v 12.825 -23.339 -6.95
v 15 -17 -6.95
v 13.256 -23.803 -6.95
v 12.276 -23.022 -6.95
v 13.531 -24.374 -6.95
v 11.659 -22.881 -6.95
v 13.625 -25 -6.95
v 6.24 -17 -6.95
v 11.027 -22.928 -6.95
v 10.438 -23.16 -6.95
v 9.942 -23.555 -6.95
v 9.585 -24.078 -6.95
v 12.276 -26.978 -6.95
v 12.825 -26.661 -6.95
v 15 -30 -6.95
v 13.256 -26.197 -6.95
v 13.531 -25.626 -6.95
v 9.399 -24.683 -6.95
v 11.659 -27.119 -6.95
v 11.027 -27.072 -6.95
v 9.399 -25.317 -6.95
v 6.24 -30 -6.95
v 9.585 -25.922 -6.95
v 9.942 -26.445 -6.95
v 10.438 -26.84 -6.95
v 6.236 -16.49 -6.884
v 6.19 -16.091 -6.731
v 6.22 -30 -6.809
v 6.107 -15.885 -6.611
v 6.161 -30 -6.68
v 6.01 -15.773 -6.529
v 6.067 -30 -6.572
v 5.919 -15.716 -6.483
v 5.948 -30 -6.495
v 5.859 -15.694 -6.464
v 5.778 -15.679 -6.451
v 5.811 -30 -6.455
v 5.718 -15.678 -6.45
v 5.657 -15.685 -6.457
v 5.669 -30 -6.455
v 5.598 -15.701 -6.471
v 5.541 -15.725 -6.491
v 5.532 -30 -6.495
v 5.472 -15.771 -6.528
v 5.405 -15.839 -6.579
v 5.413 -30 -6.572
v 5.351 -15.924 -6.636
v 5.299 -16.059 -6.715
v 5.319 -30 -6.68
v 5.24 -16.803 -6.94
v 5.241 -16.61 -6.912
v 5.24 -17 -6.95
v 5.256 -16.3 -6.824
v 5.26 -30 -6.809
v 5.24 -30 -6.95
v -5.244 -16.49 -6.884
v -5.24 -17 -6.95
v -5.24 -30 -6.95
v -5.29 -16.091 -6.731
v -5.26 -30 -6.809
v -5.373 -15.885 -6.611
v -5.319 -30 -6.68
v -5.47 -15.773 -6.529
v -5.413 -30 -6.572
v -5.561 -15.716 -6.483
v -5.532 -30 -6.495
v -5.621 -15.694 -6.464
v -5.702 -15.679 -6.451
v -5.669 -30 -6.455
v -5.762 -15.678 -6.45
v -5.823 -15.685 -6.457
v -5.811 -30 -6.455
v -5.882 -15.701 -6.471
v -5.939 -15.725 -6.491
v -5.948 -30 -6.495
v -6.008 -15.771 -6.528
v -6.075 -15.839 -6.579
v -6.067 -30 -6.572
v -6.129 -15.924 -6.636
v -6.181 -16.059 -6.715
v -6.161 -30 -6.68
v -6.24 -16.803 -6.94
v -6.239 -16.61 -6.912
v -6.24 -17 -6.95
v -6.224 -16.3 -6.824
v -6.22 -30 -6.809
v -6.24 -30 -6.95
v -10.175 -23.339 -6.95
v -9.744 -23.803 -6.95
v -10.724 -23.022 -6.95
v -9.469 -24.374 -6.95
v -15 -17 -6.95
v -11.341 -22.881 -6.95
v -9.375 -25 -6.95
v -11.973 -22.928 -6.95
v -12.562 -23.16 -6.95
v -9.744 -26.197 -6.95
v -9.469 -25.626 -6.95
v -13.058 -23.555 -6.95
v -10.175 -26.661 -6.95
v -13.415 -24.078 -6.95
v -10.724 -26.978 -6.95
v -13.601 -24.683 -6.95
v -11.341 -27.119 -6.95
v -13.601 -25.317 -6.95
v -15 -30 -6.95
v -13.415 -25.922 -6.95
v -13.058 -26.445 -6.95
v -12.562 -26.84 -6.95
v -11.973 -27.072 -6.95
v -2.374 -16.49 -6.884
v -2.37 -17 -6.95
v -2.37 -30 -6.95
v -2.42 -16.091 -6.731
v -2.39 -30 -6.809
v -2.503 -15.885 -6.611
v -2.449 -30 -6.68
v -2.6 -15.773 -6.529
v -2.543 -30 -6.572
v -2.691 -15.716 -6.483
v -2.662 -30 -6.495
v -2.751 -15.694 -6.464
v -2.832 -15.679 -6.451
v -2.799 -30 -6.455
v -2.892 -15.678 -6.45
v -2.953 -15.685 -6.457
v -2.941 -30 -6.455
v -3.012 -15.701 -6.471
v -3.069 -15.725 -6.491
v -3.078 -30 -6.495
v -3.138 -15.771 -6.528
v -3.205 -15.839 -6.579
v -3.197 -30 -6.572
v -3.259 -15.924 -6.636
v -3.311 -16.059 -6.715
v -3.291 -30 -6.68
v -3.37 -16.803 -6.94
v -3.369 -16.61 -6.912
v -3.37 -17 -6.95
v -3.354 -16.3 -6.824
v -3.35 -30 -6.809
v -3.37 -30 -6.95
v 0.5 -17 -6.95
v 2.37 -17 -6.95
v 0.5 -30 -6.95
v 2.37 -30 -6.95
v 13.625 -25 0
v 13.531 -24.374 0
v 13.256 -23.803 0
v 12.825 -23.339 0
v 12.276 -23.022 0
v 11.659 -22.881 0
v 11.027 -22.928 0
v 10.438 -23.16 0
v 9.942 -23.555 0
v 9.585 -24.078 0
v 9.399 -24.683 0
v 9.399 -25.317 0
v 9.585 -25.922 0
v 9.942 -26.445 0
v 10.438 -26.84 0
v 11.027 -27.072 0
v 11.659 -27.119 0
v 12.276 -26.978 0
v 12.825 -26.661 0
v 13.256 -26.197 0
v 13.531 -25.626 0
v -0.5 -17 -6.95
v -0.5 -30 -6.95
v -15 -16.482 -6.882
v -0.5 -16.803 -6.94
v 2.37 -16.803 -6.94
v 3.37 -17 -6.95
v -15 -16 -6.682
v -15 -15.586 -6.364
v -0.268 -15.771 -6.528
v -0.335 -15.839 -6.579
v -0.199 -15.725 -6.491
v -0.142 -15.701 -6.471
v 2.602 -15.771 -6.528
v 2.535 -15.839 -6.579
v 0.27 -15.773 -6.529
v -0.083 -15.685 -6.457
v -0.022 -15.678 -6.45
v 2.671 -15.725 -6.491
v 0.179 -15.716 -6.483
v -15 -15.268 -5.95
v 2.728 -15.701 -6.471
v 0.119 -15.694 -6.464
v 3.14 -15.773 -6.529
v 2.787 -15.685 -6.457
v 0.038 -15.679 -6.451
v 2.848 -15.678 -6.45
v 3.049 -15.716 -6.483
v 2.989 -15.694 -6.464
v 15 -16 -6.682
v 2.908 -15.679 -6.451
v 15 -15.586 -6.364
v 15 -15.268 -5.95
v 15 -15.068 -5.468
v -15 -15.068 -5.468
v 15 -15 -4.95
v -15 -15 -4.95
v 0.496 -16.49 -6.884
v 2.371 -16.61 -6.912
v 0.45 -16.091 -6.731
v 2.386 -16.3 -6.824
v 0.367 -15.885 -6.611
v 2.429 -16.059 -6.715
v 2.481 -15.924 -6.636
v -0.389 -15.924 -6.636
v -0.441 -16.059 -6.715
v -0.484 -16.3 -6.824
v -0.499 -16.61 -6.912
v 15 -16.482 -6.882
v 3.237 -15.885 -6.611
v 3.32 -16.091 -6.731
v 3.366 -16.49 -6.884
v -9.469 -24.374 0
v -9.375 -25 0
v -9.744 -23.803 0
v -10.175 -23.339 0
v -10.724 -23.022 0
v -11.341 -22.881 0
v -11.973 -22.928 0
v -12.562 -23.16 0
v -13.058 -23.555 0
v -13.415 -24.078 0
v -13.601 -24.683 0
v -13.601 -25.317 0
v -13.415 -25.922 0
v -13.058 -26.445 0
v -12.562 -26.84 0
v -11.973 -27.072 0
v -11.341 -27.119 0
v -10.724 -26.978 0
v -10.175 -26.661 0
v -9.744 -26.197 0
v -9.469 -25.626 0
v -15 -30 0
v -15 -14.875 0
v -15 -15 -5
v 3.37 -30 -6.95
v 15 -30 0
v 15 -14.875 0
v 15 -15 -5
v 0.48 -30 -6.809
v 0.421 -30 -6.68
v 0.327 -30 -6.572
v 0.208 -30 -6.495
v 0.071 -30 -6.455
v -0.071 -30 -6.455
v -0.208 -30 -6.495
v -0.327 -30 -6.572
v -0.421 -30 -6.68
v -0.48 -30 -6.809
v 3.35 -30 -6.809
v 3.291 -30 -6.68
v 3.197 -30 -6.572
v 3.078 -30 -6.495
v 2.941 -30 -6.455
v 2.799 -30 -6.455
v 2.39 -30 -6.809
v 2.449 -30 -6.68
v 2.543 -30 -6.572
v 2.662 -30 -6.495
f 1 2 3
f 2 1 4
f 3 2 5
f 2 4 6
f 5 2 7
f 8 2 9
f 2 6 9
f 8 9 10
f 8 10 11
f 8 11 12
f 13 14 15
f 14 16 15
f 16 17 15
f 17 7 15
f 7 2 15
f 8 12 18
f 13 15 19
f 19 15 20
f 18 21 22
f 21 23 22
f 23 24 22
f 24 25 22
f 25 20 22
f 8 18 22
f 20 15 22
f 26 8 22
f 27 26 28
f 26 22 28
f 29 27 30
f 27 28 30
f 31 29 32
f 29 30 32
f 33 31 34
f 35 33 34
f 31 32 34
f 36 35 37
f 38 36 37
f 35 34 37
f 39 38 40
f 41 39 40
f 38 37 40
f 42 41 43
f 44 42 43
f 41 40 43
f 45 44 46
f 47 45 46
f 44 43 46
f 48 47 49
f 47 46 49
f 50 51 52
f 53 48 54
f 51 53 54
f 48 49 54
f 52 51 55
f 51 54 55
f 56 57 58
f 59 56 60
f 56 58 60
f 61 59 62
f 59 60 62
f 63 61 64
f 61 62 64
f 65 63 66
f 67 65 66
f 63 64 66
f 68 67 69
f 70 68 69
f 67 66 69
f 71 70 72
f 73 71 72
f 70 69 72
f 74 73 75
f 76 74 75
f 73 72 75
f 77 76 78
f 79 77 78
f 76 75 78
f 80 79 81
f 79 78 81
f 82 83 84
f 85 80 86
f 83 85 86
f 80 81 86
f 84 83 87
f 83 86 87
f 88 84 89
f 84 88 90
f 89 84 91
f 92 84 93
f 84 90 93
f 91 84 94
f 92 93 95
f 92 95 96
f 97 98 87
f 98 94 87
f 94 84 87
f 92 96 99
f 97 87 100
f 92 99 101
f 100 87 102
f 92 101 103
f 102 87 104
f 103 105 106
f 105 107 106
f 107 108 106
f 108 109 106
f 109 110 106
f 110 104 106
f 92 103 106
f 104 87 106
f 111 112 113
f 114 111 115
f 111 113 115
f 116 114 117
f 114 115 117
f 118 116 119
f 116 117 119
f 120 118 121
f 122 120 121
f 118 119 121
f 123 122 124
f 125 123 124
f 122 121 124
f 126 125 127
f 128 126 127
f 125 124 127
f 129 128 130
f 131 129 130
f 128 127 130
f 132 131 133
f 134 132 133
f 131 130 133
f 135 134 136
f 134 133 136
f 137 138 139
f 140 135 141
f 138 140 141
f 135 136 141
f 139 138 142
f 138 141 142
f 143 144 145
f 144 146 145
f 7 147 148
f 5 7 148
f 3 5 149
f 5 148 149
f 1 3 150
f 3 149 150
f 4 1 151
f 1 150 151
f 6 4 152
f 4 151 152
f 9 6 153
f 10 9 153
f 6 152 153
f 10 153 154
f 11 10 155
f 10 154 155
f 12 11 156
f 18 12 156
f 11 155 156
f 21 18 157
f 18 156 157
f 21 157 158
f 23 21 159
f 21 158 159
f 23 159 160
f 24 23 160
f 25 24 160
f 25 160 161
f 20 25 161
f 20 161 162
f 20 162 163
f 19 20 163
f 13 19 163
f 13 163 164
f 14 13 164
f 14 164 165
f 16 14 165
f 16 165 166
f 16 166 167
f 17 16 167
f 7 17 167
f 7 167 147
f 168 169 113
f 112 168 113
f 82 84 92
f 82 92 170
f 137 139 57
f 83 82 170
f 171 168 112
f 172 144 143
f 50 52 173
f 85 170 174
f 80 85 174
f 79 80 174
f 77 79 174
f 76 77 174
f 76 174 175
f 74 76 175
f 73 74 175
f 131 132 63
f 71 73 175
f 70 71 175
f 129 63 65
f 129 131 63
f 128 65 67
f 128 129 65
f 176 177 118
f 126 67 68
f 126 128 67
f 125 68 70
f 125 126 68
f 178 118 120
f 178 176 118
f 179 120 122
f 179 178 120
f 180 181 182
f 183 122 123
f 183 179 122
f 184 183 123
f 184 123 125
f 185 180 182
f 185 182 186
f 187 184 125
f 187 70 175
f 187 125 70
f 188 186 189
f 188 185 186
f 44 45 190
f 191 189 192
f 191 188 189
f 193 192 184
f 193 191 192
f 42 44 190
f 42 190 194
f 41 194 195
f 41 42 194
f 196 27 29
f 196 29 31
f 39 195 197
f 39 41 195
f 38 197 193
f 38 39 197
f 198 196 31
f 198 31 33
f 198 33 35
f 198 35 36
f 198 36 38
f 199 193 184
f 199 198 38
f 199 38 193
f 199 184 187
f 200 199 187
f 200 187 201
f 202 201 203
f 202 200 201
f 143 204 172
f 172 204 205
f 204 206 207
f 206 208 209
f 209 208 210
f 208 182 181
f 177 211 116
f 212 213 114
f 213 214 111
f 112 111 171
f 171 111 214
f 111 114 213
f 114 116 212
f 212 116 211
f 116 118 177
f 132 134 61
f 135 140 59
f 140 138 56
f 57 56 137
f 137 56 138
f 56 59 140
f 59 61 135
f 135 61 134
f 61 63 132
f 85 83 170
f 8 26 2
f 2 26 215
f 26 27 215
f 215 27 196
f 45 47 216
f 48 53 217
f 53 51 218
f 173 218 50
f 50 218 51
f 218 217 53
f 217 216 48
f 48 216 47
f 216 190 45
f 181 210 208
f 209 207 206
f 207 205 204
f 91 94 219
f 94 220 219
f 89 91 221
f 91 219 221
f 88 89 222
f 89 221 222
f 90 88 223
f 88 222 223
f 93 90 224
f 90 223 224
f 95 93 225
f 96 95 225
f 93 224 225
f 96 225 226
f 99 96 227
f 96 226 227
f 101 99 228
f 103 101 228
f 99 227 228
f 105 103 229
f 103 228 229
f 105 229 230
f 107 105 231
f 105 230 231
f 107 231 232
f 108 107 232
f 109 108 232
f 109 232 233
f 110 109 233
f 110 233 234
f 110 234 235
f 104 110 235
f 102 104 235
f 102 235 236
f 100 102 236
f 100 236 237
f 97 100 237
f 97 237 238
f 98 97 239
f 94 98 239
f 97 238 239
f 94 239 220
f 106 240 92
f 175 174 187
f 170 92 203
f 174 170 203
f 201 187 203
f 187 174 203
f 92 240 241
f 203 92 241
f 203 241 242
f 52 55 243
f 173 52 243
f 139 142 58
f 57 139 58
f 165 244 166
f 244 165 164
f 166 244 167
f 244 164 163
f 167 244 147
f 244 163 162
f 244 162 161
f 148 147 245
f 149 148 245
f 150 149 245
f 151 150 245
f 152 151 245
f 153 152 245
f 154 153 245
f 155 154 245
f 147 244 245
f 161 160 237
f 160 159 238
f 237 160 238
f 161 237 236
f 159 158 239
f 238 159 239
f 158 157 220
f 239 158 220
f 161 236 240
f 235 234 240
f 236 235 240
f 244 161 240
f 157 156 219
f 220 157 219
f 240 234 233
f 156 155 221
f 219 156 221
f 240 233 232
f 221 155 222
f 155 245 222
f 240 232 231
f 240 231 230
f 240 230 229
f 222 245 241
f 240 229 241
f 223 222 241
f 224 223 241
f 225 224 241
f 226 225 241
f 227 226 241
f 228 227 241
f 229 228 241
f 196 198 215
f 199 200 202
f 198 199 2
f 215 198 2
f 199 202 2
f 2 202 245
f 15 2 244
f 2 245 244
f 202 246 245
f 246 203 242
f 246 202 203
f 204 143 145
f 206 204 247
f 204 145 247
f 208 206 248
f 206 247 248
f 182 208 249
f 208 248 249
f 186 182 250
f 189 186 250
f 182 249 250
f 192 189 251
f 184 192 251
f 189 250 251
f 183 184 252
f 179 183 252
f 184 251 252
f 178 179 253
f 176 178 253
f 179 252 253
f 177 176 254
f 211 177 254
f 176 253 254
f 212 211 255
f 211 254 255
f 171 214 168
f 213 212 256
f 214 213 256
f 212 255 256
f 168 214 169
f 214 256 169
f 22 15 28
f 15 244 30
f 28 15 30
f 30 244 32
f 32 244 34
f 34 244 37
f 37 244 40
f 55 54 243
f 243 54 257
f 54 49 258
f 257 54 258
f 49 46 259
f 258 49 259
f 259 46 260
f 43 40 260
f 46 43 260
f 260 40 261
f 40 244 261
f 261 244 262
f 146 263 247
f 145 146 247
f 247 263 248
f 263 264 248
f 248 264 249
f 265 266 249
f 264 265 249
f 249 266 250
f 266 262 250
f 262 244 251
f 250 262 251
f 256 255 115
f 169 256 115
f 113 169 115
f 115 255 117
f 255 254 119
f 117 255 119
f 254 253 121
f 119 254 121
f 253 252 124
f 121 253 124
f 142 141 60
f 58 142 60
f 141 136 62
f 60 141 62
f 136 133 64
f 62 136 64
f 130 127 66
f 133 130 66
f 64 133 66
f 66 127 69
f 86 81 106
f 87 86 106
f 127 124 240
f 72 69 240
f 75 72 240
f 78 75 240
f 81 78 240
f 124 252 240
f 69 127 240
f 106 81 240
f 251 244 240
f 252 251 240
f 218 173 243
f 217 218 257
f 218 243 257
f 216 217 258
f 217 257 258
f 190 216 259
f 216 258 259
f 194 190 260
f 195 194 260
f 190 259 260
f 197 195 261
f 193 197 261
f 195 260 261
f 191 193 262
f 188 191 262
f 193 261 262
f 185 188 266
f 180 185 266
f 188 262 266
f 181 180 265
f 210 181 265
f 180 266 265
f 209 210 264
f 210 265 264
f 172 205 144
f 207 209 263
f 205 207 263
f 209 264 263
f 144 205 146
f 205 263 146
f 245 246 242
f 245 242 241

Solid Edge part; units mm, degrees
sketch "Sketch1" plane through (0, 0, 0) normal (0, 0, 1) x (1, 0, 0)
  line L0 (15, -30) -> (-15, -30)
  line L1 (-15, -30) -> (-15, 30)
  line L2 (-15, 30) -> (15, 30)
  line L3 (15, 30) -> (15, -30)
extrude "Protrusion1" add sketch "Sketch1" against normal blind 5
sketch "Sketch2" plane through (0, -30, -2.5) normal (0, -1, 0) x (1, 0, 0)
  line L0 (15, -2.5) -> (15, -4.45)
  line L1 (15, -4.45) -> (-15, -4.45)
  line L2 (-15, -4.45) -> (-15, -2.5)
  line L3 (-15, -2.5) -> (15, -2.5)
extrude "ExtrudedProtrusion_2" add sketch "Sketch2" against normal blind 15
fillet "Round_1" radius 2 1 edges at (0, -15, -6.95)
sketch "Sketch3" plane through (0, -30, -3.475) normal (0, -1, 0) x (1, 0, 0)
  circle A0 centre (-5.74, -3.475) radius 0.5
  circle A1 centre (-2.87, -3.475) radius 0.5
  circle A2 centre (0, -3.475) radius 0.5
  circle A3 centre (2.87, -3.475) radius 0.5
  circle A4 centre (5.74, -3.475) radius 0.5
  dimension "D1" = 2.87
extrude "Cutout1" cut sketch "Sketch3" against normal up to next
sketch "Sketch4" plane through (0, 0, 0) normal (0, 0, 1) x (1, 0, 0)
  circle A0 centre (11.5, -25) radius 2.125
  circle A1 centre (-11.5, -25) radius 2.125
  circle A2 centre (-11.5, 25) radius 2.125
  circle A3 centre (11.5, 25) radius 2.125
  dimension "D1" = 23
  dimension "D2" = 50
extrude "Cutout2" cut sketch "Sketch4" against normal up to next
sketch "Sketch5" plane through (0, 7.5, -5) normal (0, 0, -1) x (-1, 0, 0)
  line L0 (3.2448, 10.1167) -> (3.2448, -2.3765)
  line L1 (3.2448, -2.3765) -> (8.2455, -2.3765)
  line L2 (8.2455, -2.3765) -> (8.2455, 10.1167)
  line L3 (8.2455, 10.1167) -> (3.2448, 10.1167)
extrude "Cutout3" cut sketch "Sketch5" against normal up to next
sketch "Sketch6" plane through (15, 0, -3.475) normal (1, 0, 0) x (0, 1, 0)
  line L0 (-15, -1.525) -> (-14.875, 3.475)
  line L1 (-14.875, 3.475) -> (30, 3.475)
  line L2 (30, 3.475) -> (30, -1.525)
  line L3 (30, -1.525) -> (-15, -1.525)
extrude "Cutout4" cut sketch "Sketch6" against normal up to next
